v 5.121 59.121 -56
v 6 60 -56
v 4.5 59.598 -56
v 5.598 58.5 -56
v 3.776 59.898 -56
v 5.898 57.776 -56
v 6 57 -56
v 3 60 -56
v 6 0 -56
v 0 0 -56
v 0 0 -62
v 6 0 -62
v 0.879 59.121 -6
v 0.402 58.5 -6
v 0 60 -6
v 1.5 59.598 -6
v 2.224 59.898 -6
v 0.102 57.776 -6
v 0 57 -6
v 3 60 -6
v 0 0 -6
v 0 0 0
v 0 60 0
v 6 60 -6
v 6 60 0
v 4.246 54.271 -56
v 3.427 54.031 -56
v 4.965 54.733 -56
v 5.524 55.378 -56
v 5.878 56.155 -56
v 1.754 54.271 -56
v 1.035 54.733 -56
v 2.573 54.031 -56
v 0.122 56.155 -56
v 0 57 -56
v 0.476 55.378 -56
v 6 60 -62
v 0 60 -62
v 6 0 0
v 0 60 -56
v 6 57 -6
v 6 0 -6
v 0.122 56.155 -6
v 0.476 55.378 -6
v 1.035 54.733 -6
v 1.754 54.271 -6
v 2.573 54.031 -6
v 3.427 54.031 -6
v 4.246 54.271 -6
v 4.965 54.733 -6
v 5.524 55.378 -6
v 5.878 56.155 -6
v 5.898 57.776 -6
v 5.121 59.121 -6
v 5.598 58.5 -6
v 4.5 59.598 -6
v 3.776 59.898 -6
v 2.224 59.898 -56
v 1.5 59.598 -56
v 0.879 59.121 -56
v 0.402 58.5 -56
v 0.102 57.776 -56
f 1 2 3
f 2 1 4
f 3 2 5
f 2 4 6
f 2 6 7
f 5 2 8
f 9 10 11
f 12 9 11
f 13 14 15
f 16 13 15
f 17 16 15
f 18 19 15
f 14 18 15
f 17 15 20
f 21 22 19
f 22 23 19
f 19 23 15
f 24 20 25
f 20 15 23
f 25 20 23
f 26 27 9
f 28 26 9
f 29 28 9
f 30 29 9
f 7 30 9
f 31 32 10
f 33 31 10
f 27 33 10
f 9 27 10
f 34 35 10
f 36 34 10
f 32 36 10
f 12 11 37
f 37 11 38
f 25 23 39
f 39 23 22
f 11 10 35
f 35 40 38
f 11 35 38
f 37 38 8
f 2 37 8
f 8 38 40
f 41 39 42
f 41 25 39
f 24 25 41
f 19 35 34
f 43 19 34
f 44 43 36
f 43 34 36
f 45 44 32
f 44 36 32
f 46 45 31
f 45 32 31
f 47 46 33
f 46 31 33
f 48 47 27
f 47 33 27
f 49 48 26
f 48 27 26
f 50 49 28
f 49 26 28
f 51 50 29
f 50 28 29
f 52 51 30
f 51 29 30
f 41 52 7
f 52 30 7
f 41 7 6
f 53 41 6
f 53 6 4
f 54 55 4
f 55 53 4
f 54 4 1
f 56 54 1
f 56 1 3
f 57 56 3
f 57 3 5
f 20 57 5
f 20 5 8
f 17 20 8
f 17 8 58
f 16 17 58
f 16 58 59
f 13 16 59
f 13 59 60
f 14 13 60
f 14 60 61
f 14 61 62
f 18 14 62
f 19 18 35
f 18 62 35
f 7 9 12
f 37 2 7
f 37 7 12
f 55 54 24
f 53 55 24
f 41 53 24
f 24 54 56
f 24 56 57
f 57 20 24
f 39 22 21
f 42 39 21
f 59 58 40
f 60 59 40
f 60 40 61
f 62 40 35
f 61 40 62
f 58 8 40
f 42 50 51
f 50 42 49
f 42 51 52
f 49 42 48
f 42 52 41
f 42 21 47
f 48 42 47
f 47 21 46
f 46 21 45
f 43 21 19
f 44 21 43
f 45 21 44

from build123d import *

# Parameters (mm, degrees)
SALIENTE_EXTRUIR1_DEPTH   = 6
SALIENTE_EXTRUIR1_2_DEPTH = 6
SALIENTE_EXTRUIR2_REACH   = 84.292
CROQUIS2_R                = 3


with BuildPart() as part:
    # Croquis1 → Saliente-Extruir1 (new body)
    with BuildSketch(Plane(origin=(0, 0, 0), x_dir=(0, 0, -1), z_dir=(1, 0, 0))):
        Polygon((56, 0), (62, 0), (62, 60), (56, 60), (56, 54), align=None)
    extrude(amount=SALIENTE_EXTRUIR1_DEPTH)


with BuildPart() as body_2:
    # Croquis1 → Saliente-Extruir1 2 (new body)
    with BuildSketch(Plane(origin=(0, 0, 0), x_dir=(0, 0, -1), z_dir=(1, 0, 0))):
        Polygon((0, 0), (6, 0), (6, 54), (6, 60), (0, 60), align=None)
    extrude(amount=SALIENTE_EXTRUIR1_2_DEPTH)

    # Croquis2 → Saliente-Extruir2 (add, up to next)
    with BuildSketch(Plane.XY.offset(-56), mode=Mode.PRIVATE) as saliente_extruir2_sk1:
        with Locations(Location((3, 57, 0), (0, 0, 180))):
            Circle(CROQUIS2_R)
    saliente_extruir2_tool1 = extrude(saliente_extruir2_sk1.sketch, amount=SALIENTE_EXTRUIR2_REACH, mode=Mode.PRIVATE) - body_2.part

    add(part.part)  # Saliente-Extruir2 merges part
    add(saliente_extruir2_tool1.solids().sort_by_distance((3, 57, -56))[0])


solid = body_2.part
